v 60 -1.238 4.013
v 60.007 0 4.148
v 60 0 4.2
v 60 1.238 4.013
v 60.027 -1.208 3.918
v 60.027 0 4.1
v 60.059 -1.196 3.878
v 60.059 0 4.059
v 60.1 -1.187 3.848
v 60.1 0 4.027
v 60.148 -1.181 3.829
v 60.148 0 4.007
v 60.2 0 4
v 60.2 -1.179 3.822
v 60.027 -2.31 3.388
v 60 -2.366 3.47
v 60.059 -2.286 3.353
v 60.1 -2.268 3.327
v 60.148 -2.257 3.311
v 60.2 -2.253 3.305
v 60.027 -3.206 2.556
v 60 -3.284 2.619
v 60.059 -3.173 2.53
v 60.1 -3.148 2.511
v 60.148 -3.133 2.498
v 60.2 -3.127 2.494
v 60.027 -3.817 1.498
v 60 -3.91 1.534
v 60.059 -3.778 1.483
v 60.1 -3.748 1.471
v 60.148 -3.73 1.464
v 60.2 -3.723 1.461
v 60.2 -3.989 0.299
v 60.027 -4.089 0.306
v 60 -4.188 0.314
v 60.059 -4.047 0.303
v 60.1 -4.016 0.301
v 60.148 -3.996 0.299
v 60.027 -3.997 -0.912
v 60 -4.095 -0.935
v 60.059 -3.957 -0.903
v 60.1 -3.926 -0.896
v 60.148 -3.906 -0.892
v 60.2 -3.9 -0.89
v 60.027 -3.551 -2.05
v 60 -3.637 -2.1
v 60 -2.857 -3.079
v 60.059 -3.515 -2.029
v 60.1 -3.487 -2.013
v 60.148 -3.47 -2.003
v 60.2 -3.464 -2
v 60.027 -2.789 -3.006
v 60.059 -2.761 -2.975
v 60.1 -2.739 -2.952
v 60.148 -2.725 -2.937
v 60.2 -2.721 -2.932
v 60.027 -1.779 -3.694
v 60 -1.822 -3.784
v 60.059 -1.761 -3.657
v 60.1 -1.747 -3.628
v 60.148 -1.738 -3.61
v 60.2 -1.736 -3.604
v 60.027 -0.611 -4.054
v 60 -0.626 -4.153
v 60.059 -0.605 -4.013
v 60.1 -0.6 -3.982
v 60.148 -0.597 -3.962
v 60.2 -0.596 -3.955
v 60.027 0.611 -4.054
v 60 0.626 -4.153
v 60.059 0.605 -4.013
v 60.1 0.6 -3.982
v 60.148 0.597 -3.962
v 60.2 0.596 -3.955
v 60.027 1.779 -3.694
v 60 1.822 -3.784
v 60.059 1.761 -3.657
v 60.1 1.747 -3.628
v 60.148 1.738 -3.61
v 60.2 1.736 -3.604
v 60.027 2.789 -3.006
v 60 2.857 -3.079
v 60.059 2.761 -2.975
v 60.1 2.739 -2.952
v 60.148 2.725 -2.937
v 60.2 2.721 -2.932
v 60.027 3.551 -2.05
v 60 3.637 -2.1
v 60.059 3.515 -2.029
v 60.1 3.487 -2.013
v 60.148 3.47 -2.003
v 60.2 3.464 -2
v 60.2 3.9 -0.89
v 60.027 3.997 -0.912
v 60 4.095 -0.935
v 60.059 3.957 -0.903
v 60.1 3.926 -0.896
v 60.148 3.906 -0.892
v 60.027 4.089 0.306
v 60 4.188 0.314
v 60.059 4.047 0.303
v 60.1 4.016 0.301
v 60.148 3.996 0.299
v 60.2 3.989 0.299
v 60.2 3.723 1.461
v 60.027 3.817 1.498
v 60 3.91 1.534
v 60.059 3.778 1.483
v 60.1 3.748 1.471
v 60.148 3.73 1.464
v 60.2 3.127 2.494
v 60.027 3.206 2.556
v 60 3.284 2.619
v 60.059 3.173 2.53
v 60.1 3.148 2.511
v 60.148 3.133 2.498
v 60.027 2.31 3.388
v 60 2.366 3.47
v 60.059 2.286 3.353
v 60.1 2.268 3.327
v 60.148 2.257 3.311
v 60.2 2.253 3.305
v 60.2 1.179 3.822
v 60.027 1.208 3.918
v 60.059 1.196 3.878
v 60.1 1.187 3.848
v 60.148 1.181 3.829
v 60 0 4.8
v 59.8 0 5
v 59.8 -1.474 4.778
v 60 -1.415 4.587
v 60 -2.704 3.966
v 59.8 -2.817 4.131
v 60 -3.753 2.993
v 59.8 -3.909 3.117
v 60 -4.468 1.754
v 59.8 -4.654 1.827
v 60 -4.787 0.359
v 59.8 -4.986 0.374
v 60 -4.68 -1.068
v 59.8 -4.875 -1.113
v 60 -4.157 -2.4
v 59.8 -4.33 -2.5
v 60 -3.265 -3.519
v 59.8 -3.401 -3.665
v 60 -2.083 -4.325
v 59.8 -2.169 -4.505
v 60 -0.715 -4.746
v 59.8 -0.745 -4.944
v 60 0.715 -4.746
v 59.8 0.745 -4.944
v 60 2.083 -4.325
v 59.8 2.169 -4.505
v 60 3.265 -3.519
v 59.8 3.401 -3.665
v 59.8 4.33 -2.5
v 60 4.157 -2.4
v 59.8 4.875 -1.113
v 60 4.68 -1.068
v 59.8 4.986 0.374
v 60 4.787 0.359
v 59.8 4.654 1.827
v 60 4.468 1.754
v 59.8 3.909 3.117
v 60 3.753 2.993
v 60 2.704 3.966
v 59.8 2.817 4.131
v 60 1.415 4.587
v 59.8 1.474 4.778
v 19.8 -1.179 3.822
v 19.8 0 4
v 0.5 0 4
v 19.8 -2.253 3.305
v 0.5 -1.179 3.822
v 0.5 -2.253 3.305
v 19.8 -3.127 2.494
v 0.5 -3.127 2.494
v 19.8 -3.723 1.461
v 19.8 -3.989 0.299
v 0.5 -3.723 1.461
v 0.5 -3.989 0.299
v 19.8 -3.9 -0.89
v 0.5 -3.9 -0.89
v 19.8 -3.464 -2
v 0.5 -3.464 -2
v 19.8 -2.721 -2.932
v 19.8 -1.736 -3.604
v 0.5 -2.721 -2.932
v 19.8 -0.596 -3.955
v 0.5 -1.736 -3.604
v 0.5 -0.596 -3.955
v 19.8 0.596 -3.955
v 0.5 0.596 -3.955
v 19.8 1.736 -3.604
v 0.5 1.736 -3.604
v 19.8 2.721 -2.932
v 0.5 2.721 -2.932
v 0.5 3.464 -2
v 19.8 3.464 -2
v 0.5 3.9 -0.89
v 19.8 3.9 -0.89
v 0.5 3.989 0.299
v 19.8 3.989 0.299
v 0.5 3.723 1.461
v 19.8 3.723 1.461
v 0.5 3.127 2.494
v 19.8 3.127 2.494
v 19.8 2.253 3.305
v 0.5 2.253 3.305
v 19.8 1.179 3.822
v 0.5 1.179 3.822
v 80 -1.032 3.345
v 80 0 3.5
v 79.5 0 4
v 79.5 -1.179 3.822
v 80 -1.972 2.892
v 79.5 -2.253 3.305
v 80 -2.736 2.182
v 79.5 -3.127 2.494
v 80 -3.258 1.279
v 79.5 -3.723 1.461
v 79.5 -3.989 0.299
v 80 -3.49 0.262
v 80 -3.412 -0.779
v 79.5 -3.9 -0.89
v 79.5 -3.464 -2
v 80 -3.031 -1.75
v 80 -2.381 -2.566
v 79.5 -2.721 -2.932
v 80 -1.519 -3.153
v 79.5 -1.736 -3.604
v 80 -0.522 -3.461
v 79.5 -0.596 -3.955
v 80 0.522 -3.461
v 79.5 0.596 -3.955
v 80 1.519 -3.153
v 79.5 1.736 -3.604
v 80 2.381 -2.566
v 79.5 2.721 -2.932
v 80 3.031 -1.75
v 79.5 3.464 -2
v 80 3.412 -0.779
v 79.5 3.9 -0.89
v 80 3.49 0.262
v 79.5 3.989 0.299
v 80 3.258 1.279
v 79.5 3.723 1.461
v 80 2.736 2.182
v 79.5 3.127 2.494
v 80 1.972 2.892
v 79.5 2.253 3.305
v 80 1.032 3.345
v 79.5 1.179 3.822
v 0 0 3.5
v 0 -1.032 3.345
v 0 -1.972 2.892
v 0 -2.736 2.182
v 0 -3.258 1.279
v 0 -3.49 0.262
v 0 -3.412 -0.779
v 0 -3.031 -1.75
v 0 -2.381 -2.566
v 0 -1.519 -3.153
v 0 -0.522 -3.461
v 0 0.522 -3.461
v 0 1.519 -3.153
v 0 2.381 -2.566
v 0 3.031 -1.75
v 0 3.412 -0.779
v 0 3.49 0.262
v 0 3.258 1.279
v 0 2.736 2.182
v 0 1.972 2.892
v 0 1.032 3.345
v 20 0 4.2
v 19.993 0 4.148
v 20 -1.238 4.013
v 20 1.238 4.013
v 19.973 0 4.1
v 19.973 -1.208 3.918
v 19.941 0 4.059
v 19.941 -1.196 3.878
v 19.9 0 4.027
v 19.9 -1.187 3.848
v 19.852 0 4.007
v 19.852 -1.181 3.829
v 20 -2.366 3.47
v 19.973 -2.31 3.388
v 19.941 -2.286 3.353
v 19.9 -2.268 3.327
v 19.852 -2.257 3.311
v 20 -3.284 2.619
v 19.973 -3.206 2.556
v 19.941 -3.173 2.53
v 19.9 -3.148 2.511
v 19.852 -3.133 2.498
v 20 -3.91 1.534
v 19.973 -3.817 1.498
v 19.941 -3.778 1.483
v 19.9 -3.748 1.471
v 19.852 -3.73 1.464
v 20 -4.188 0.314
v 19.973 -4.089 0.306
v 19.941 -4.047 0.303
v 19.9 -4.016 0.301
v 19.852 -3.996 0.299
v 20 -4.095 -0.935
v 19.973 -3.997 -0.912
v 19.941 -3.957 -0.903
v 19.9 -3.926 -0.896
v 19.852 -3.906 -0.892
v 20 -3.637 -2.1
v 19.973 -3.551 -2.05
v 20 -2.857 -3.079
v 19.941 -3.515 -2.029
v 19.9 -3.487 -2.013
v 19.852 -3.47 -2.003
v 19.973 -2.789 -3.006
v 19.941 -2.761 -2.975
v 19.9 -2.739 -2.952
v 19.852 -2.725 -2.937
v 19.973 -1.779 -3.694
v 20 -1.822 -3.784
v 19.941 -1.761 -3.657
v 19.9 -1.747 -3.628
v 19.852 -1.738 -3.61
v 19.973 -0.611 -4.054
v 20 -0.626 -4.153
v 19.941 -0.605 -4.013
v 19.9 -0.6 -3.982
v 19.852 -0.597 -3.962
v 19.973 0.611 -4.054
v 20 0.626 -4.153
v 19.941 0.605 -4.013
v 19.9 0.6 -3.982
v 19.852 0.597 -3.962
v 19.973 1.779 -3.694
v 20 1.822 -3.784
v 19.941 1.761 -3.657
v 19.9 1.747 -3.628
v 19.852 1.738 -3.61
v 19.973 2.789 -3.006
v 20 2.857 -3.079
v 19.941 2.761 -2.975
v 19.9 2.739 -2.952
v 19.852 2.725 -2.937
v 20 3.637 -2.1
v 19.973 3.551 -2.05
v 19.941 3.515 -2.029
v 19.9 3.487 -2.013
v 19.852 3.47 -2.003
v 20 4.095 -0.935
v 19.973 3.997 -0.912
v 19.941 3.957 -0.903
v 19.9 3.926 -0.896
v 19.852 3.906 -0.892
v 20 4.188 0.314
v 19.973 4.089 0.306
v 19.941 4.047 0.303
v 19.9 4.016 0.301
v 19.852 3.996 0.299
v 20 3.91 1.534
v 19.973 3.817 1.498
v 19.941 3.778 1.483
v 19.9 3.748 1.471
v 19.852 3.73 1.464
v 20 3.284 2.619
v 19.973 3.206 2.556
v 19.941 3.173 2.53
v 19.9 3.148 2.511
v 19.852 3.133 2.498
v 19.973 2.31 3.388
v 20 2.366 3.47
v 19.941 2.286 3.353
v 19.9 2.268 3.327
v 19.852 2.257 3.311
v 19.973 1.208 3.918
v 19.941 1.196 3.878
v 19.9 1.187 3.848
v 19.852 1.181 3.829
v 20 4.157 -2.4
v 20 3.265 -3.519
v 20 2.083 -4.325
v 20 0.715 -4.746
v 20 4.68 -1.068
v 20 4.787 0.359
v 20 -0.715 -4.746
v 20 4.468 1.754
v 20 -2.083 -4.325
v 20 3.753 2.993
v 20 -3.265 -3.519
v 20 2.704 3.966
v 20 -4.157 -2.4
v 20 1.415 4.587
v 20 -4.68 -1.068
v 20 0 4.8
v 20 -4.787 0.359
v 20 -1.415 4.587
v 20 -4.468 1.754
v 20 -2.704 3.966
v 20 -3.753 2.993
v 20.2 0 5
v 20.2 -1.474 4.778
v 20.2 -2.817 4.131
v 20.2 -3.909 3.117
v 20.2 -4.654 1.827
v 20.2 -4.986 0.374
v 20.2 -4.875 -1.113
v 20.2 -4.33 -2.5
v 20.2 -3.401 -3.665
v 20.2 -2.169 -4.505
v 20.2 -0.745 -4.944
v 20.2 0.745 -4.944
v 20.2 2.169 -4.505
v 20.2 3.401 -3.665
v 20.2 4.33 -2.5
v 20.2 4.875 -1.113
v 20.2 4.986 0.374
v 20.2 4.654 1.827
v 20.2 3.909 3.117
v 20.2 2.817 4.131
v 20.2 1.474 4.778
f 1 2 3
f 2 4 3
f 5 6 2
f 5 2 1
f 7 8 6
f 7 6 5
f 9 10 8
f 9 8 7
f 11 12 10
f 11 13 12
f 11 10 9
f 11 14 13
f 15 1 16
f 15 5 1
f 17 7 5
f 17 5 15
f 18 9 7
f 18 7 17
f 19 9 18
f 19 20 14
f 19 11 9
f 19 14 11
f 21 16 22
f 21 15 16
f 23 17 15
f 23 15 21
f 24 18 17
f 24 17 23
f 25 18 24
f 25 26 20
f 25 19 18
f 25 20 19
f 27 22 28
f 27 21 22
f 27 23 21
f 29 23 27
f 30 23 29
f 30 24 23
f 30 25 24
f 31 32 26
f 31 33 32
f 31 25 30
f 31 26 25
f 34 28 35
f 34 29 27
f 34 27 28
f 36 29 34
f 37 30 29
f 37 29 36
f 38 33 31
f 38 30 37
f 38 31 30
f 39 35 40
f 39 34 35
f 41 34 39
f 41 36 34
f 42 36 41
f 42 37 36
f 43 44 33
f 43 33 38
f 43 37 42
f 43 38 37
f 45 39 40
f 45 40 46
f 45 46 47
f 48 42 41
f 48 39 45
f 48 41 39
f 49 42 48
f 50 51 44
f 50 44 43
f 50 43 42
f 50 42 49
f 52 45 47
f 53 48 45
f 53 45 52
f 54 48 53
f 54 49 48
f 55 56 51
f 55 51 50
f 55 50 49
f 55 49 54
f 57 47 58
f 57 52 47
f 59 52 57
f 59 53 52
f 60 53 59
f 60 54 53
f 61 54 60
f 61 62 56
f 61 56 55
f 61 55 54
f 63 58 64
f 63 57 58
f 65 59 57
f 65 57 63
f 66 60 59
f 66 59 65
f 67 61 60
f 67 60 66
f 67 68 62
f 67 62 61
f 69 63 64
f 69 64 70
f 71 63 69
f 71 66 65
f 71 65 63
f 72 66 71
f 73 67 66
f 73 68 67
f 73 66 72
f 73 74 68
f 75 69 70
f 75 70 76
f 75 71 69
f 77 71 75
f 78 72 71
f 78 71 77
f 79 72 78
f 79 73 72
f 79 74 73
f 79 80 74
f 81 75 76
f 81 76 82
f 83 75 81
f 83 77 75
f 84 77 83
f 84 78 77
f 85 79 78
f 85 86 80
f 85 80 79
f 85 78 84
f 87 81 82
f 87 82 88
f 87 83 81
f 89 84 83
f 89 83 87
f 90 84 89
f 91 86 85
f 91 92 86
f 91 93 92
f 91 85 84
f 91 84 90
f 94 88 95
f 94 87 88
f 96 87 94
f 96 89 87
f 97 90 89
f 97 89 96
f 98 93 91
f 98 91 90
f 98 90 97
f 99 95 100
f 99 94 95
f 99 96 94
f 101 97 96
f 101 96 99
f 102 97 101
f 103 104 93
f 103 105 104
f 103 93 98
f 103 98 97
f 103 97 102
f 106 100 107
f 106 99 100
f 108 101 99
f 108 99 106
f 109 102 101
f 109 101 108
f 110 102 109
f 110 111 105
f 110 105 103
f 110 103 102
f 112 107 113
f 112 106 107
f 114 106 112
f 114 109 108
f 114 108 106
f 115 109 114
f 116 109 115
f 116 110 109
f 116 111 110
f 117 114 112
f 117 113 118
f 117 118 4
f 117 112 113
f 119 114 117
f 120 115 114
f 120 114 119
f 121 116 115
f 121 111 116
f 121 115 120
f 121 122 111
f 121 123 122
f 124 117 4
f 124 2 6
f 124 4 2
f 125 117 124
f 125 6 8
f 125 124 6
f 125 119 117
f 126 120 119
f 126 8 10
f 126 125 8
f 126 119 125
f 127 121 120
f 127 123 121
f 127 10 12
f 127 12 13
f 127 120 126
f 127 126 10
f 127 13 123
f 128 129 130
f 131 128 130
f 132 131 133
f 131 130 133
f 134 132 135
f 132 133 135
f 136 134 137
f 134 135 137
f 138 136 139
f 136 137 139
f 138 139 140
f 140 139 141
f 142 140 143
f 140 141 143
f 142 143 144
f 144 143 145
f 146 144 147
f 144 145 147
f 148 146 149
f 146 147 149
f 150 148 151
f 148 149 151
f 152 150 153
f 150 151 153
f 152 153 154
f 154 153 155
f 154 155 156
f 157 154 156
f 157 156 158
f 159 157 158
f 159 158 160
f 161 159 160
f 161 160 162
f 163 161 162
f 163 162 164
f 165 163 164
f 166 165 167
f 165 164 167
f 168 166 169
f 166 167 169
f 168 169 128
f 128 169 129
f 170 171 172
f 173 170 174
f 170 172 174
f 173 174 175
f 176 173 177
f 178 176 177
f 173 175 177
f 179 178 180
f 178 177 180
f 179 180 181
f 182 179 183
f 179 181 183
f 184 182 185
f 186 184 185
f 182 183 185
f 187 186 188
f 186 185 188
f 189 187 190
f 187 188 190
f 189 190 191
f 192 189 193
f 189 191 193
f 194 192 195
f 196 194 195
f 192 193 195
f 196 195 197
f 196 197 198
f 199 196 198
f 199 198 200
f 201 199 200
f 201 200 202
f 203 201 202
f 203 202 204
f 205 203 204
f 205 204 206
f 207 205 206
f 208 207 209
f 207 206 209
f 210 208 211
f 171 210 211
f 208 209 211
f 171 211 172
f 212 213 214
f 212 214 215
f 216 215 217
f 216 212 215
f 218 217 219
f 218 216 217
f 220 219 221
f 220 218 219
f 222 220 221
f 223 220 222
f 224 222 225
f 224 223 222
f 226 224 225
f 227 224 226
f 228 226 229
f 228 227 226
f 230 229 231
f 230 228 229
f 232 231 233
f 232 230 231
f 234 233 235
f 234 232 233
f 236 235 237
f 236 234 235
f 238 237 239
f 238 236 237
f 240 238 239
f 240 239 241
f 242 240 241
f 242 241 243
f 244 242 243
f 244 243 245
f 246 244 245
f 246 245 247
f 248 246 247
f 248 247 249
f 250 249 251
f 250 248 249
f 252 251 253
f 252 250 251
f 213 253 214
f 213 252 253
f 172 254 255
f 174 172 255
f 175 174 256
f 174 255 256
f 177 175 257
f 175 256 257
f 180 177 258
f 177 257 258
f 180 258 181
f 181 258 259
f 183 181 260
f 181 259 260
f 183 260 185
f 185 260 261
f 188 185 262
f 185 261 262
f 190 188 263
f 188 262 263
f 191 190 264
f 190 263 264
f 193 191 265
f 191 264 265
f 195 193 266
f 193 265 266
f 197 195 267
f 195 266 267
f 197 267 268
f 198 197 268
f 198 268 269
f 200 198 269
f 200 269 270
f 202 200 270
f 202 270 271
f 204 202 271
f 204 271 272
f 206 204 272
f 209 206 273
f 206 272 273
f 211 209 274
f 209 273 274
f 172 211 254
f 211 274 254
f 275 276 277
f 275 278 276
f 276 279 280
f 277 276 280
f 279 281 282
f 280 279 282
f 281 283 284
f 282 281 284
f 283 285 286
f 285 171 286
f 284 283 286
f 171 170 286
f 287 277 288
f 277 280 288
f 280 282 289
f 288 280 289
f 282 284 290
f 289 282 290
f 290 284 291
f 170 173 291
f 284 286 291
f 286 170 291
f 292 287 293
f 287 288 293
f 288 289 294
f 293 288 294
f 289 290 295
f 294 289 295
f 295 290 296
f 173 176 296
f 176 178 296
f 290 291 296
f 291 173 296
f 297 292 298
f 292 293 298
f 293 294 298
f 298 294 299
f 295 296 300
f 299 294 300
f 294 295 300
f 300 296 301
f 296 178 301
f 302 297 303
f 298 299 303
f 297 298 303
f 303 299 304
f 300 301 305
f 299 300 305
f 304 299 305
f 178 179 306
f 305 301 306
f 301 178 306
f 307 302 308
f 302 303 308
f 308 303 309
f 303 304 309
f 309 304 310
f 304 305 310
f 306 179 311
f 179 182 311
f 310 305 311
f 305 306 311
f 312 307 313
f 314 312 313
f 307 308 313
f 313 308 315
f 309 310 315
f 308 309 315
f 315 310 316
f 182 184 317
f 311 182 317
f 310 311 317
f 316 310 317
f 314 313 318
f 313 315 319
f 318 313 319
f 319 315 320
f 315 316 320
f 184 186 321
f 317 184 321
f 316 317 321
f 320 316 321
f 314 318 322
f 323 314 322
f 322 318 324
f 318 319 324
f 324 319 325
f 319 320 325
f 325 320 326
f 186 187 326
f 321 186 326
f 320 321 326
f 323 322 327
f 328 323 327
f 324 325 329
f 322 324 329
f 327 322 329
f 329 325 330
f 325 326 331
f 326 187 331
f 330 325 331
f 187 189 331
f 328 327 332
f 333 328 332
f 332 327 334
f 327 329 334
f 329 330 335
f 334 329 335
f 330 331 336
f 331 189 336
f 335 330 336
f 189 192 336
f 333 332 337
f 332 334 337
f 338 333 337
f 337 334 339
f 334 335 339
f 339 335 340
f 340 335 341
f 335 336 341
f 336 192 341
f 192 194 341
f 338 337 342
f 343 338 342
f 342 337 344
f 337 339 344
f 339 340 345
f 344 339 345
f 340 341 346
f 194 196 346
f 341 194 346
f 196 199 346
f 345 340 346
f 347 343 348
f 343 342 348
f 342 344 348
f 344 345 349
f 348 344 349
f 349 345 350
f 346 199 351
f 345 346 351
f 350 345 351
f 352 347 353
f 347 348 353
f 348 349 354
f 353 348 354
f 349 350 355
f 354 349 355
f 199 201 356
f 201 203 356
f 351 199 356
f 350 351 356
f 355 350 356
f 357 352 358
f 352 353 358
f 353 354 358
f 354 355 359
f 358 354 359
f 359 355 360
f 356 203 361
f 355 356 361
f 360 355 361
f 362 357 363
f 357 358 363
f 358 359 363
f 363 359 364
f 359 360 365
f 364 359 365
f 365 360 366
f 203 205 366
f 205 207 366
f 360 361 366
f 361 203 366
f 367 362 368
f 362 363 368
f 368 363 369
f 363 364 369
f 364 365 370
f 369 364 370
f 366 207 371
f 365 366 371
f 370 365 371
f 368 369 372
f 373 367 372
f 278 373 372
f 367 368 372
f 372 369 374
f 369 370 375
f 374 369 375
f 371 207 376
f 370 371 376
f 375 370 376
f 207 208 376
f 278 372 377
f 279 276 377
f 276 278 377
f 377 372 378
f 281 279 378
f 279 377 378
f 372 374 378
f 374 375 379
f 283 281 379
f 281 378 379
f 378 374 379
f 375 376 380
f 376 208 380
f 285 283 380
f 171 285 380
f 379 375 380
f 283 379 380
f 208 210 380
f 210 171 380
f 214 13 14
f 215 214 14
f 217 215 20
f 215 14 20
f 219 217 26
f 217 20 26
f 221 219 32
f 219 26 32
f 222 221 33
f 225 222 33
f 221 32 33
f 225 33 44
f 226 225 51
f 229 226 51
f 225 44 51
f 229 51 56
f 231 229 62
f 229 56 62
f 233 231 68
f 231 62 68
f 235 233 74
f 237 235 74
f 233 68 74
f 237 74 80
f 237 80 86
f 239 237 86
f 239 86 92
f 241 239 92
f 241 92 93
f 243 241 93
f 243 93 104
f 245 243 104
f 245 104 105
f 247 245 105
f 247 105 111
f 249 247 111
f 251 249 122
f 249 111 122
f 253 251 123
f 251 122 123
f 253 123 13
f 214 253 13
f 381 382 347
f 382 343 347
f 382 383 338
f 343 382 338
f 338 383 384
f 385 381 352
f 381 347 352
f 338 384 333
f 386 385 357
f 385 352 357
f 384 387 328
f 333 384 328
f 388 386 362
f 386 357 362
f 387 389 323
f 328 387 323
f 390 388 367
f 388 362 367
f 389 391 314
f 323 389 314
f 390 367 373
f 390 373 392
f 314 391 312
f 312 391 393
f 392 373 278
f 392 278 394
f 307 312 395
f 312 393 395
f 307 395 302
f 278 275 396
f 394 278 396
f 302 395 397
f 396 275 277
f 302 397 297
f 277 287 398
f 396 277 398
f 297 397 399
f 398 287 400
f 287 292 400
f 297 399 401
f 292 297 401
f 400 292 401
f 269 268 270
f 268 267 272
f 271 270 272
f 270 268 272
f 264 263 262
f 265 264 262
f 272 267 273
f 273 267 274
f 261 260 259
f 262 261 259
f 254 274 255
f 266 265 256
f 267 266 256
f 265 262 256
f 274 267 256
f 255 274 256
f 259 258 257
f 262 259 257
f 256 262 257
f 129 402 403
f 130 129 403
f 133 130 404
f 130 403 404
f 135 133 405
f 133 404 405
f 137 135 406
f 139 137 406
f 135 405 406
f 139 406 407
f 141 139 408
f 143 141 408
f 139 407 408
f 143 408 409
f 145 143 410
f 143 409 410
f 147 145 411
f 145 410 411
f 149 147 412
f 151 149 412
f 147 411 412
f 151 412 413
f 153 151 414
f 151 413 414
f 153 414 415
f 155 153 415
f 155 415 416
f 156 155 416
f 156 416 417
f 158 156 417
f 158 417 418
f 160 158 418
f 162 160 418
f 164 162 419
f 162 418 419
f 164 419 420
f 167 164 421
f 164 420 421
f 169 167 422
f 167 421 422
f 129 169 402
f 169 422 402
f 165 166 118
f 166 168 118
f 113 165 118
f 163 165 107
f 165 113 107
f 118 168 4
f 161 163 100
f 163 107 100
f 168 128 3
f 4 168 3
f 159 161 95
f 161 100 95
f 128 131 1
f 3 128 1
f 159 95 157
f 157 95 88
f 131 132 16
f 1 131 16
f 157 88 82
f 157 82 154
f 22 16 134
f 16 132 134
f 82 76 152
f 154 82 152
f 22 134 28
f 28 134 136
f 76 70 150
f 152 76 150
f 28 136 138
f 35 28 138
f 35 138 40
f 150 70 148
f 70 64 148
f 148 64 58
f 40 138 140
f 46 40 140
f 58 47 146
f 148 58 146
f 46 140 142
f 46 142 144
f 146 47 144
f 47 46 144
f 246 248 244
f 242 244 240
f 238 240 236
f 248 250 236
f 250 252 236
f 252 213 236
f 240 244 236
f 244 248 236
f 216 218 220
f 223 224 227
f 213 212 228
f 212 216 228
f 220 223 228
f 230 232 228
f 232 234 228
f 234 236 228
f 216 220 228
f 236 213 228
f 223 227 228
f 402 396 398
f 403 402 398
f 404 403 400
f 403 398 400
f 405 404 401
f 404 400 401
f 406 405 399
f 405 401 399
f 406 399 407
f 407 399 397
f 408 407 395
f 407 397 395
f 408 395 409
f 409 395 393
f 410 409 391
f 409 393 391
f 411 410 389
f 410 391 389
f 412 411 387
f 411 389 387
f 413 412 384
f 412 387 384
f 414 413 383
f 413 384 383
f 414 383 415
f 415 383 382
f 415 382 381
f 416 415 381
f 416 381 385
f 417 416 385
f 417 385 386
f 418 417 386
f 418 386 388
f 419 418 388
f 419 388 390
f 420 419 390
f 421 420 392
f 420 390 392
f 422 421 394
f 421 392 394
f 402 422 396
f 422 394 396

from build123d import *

# Parameters (mm, degrees)
CHAMFER1_SIZE = 0.2
CHAMFER2_SIZE = 0.2
CHAMFER3_SIZE = 0.5
CHAMFER4_SIZE = 0.5
FILLET1_R     = 0.2
FILLET2_R     = 0.2


with BuildPart() as part:
    # Sketch1 → Revolve1 (revolve)
    with BuildSketch(Plane.XY):
        Polygon((0, 0), (80, 0), (80, 4), (60, 4), (60, 5), (20, 5), (20, 4), (0, 4), align=None)
    revolve(axis=Axis((0, 0, 0), (1, 0, 0)))

    # Chamfer1
    chamfer1_edges = [part.edges().sort_by_distance(p)[0] for p in [
        (60, -5, 0),
    ]]
    chamfer(chamfer1_edges, length=CHAMFER1_SIZE)

    # Chamfer2
    chamfer2_edges = [part.edges().sort_by_distance(p)[0] for p in [
        (20, -5, 0),
    ]]
    chamfer(chamfer2_edges, length=CHAMFER2_SIZE)

    # Chamfer3
    chamfer3_edges = [part.edges().sort_by_distance(p)[0] for p in [
        (0, -4, 0),
    ]]
    chamfer(chamfer3_edges, length=CHAMFER3_SIZE)

    # Chamfer4
    chamfer4_edges = [part.edges().sort_by_distance(p)[0] for p in [
        (80, -4, 0),
    ]]
    chamfer(chamfer4_edges, length=CHAMFER4_SIZE)

    # Fillet1
    fillet1_edges = [part.edges().sort_by_distance(p)[0] for p in [
        (20, -4, 0),
    ]]
    fillet(fillet1_edges, radius=FILLET1_R)

    # Fillet2
    fillet2_edges = [part.edges().sort_by_distance(p)[0] for p in [
        (60, -4, 0),
    ]]
    fillet(fillet2_edges, radius=FILLET2_R)


solid = part.part
